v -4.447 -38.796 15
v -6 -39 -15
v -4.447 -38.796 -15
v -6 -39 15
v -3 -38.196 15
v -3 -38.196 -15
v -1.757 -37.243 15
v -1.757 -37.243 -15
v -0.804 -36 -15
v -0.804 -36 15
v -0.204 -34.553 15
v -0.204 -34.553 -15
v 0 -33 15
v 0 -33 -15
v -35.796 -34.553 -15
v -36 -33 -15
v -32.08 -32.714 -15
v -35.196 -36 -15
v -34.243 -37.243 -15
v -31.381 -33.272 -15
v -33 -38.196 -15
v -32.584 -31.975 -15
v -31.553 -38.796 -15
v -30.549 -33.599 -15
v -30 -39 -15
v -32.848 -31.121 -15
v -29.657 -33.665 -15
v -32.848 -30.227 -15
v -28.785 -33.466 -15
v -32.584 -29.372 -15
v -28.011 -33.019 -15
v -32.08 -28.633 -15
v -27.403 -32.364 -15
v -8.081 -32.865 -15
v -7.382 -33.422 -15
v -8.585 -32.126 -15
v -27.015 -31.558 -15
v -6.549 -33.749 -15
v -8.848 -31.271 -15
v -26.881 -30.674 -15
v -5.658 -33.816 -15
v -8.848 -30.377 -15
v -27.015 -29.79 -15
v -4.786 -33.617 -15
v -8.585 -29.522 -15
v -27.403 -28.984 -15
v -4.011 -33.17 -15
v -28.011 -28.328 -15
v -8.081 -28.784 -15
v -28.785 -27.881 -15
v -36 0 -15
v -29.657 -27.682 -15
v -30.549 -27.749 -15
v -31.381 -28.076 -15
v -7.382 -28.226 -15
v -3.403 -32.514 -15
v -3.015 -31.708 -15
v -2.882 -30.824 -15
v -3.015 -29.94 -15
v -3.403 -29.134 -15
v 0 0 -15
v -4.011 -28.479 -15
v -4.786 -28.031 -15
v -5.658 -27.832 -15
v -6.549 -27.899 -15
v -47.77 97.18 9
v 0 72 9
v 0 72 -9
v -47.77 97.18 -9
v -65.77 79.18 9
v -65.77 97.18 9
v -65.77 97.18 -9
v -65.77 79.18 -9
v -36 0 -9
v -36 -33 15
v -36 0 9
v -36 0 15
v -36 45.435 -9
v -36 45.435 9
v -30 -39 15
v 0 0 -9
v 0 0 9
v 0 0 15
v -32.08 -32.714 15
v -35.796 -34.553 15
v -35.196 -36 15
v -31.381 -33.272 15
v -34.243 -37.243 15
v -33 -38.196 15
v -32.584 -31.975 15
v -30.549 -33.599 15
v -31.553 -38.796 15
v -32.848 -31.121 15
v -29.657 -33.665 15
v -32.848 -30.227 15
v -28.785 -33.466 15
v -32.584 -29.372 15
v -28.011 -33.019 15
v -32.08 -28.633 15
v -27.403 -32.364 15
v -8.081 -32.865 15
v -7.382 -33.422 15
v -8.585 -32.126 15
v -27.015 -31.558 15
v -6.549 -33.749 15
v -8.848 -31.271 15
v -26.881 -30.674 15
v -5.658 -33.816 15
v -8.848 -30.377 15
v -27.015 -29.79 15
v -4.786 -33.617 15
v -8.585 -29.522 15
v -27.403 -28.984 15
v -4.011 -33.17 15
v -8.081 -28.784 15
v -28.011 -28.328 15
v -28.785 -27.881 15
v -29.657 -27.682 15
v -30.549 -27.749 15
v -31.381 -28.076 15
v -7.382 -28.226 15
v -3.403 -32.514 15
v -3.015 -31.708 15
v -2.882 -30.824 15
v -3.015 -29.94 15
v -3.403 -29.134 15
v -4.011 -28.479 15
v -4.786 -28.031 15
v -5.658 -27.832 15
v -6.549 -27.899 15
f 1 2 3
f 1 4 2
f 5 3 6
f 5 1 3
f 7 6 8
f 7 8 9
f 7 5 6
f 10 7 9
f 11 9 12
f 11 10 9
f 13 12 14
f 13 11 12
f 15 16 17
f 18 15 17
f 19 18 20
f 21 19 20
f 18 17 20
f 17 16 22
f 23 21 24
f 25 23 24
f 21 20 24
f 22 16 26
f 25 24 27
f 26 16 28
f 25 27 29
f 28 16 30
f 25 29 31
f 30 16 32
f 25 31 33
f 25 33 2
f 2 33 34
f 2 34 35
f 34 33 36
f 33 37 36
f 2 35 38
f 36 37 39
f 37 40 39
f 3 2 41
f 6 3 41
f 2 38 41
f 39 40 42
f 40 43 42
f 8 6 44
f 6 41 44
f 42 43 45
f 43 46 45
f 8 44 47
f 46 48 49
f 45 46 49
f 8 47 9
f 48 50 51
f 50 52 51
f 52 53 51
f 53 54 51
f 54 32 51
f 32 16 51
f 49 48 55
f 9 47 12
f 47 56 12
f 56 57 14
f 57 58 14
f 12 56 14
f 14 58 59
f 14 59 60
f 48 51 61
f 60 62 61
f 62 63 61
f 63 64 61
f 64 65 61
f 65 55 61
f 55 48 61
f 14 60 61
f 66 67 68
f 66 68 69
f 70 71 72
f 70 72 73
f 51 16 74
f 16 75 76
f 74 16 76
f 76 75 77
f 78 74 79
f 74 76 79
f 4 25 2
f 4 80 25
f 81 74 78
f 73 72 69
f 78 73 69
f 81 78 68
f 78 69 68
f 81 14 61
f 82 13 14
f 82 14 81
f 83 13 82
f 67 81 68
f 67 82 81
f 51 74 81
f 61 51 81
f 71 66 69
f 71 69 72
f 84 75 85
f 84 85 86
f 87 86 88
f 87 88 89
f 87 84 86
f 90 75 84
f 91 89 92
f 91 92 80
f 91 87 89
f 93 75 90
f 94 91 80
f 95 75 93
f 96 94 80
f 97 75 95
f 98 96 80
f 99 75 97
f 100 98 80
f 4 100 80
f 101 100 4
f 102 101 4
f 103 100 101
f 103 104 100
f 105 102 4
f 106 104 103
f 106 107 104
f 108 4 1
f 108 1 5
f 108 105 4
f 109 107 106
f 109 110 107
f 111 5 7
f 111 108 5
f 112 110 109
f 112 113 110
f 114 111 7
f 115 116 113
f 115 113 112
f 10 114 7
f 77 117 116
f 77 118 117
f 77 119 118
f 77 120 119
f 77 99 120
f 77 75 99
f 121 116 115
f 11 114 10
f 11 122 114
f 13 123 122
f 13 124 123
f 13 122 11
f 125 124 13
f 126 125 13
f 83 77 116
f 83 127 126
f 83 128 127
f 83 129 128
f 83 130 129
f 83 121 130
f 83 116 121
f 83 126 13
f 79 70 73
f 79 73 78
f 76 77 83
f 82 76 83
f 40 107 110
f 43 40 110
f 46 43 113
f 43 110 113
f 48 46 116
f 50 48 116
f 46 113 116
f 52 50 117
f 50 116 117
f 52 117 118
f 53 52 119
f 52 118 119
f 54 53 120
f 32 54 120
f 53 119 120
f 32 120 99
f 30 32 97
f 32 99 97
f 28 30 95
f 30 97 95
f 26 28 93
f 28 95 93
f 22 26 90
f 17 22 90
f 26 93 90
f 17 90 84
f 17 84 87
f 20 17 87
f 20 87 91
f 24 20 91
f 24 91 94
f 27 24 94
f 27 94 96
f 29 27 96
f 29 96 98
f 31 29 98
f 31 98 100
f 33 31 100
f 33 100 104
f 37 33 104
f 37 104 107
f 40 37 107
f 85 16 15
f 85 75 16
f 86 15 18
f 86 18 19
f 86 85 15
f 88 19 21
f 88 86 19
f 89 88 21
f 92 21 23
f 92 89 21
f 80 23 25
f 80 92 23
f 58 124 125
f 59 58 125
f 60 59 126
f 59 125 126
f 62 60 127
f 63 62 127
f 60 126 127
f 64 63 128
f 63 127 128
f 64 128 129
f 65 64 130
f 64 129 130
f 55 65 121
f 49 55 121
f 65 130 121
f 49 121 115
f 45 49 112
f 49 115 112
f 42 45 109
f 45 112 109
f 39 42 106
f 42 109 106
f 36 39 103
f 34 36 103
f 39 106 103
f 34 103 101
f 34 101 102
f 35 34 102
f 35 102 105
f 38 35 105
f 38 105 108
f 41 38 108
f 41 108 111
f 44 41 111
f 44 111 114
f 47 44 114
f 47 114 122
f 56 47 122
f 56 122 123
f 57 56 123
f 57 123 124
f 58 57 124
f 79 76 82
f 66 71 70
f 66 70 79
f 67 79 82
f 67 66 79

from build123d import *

# Parameters (mm, degrees)
EXTRUDE_1_DEPTH     = 9
EXTRUDE_2_DEPTH     = 36
SKETCH_3_W          = 36
SKETCH_3_H          = 39
EXTRUDE_4_DEPTH     = 15
SKETCH_5_R          = 3
CUT_EXTRUDE_1_DEPTH = 122.11819461
FILLET_1_R          = 6


with BuildPart() as part:
    # 草图1 → 凸台-拉伸1 (new, symmetric)
    with BuildSketch(Plane.XY):
        Polygon((0, 0), (0, 72), (-47.770032799, 97.179832534), (-65.770032799, 97.179832534), (-65.770032799, 79.179832534), (-36, 45.434534385), (-36, 0), align=None)
    extrude(amount=EXTRUDE_1_DEPTH, both=True)

    # 草图2 → 凸台-拉伸2 (add)
    with BuildSketch(Plane(origin=(0, 0, 0), x_dir=(0, 0, -1), z_dir=(1, 0, 0))):
        Polygon((-3.6, 0), (-8.977776638, -6), (9.022223362, -6), (3.6, 0), align=None)
    extrude(amount=-EXTRUDE_2_DEPTH)

    # 草图3 → 凸台-拉伸4 (add, symmetric)
    with BuildSketch(Plane.XY):
        with Locations((-18, -19.5)):
            Rectangle(SKETCH_3_W, SKETCH_3_H)
    extrude(amount=EXTRUDE_4_DEPTH, both=True)

    # 草图5 → 切除-拉伸1 (cut, through all)
    with BuildSketch(Plane.XY.offset(15)):
        with Locations((-29.881296057, -30.673800583)):
            Circle(SKETCH_5_R)
        with Locations((-5.88176625, -30.824030402)):
            Circle(SKETCH_5_R)
    extrude(amount=-CUT_EXTRUDE_1_DEPTH, mode=Mode.SUBTRACT)

    # 圆角1
    fillet_1_edges = [part.edges().sort_by_distance(p)[0] for p in [
        (-36, -39, 0),
        (0, -39, 0),
    ]]
    fillet(fillet_1_edges, radius=FILLET_1_R)


solid = part.part
